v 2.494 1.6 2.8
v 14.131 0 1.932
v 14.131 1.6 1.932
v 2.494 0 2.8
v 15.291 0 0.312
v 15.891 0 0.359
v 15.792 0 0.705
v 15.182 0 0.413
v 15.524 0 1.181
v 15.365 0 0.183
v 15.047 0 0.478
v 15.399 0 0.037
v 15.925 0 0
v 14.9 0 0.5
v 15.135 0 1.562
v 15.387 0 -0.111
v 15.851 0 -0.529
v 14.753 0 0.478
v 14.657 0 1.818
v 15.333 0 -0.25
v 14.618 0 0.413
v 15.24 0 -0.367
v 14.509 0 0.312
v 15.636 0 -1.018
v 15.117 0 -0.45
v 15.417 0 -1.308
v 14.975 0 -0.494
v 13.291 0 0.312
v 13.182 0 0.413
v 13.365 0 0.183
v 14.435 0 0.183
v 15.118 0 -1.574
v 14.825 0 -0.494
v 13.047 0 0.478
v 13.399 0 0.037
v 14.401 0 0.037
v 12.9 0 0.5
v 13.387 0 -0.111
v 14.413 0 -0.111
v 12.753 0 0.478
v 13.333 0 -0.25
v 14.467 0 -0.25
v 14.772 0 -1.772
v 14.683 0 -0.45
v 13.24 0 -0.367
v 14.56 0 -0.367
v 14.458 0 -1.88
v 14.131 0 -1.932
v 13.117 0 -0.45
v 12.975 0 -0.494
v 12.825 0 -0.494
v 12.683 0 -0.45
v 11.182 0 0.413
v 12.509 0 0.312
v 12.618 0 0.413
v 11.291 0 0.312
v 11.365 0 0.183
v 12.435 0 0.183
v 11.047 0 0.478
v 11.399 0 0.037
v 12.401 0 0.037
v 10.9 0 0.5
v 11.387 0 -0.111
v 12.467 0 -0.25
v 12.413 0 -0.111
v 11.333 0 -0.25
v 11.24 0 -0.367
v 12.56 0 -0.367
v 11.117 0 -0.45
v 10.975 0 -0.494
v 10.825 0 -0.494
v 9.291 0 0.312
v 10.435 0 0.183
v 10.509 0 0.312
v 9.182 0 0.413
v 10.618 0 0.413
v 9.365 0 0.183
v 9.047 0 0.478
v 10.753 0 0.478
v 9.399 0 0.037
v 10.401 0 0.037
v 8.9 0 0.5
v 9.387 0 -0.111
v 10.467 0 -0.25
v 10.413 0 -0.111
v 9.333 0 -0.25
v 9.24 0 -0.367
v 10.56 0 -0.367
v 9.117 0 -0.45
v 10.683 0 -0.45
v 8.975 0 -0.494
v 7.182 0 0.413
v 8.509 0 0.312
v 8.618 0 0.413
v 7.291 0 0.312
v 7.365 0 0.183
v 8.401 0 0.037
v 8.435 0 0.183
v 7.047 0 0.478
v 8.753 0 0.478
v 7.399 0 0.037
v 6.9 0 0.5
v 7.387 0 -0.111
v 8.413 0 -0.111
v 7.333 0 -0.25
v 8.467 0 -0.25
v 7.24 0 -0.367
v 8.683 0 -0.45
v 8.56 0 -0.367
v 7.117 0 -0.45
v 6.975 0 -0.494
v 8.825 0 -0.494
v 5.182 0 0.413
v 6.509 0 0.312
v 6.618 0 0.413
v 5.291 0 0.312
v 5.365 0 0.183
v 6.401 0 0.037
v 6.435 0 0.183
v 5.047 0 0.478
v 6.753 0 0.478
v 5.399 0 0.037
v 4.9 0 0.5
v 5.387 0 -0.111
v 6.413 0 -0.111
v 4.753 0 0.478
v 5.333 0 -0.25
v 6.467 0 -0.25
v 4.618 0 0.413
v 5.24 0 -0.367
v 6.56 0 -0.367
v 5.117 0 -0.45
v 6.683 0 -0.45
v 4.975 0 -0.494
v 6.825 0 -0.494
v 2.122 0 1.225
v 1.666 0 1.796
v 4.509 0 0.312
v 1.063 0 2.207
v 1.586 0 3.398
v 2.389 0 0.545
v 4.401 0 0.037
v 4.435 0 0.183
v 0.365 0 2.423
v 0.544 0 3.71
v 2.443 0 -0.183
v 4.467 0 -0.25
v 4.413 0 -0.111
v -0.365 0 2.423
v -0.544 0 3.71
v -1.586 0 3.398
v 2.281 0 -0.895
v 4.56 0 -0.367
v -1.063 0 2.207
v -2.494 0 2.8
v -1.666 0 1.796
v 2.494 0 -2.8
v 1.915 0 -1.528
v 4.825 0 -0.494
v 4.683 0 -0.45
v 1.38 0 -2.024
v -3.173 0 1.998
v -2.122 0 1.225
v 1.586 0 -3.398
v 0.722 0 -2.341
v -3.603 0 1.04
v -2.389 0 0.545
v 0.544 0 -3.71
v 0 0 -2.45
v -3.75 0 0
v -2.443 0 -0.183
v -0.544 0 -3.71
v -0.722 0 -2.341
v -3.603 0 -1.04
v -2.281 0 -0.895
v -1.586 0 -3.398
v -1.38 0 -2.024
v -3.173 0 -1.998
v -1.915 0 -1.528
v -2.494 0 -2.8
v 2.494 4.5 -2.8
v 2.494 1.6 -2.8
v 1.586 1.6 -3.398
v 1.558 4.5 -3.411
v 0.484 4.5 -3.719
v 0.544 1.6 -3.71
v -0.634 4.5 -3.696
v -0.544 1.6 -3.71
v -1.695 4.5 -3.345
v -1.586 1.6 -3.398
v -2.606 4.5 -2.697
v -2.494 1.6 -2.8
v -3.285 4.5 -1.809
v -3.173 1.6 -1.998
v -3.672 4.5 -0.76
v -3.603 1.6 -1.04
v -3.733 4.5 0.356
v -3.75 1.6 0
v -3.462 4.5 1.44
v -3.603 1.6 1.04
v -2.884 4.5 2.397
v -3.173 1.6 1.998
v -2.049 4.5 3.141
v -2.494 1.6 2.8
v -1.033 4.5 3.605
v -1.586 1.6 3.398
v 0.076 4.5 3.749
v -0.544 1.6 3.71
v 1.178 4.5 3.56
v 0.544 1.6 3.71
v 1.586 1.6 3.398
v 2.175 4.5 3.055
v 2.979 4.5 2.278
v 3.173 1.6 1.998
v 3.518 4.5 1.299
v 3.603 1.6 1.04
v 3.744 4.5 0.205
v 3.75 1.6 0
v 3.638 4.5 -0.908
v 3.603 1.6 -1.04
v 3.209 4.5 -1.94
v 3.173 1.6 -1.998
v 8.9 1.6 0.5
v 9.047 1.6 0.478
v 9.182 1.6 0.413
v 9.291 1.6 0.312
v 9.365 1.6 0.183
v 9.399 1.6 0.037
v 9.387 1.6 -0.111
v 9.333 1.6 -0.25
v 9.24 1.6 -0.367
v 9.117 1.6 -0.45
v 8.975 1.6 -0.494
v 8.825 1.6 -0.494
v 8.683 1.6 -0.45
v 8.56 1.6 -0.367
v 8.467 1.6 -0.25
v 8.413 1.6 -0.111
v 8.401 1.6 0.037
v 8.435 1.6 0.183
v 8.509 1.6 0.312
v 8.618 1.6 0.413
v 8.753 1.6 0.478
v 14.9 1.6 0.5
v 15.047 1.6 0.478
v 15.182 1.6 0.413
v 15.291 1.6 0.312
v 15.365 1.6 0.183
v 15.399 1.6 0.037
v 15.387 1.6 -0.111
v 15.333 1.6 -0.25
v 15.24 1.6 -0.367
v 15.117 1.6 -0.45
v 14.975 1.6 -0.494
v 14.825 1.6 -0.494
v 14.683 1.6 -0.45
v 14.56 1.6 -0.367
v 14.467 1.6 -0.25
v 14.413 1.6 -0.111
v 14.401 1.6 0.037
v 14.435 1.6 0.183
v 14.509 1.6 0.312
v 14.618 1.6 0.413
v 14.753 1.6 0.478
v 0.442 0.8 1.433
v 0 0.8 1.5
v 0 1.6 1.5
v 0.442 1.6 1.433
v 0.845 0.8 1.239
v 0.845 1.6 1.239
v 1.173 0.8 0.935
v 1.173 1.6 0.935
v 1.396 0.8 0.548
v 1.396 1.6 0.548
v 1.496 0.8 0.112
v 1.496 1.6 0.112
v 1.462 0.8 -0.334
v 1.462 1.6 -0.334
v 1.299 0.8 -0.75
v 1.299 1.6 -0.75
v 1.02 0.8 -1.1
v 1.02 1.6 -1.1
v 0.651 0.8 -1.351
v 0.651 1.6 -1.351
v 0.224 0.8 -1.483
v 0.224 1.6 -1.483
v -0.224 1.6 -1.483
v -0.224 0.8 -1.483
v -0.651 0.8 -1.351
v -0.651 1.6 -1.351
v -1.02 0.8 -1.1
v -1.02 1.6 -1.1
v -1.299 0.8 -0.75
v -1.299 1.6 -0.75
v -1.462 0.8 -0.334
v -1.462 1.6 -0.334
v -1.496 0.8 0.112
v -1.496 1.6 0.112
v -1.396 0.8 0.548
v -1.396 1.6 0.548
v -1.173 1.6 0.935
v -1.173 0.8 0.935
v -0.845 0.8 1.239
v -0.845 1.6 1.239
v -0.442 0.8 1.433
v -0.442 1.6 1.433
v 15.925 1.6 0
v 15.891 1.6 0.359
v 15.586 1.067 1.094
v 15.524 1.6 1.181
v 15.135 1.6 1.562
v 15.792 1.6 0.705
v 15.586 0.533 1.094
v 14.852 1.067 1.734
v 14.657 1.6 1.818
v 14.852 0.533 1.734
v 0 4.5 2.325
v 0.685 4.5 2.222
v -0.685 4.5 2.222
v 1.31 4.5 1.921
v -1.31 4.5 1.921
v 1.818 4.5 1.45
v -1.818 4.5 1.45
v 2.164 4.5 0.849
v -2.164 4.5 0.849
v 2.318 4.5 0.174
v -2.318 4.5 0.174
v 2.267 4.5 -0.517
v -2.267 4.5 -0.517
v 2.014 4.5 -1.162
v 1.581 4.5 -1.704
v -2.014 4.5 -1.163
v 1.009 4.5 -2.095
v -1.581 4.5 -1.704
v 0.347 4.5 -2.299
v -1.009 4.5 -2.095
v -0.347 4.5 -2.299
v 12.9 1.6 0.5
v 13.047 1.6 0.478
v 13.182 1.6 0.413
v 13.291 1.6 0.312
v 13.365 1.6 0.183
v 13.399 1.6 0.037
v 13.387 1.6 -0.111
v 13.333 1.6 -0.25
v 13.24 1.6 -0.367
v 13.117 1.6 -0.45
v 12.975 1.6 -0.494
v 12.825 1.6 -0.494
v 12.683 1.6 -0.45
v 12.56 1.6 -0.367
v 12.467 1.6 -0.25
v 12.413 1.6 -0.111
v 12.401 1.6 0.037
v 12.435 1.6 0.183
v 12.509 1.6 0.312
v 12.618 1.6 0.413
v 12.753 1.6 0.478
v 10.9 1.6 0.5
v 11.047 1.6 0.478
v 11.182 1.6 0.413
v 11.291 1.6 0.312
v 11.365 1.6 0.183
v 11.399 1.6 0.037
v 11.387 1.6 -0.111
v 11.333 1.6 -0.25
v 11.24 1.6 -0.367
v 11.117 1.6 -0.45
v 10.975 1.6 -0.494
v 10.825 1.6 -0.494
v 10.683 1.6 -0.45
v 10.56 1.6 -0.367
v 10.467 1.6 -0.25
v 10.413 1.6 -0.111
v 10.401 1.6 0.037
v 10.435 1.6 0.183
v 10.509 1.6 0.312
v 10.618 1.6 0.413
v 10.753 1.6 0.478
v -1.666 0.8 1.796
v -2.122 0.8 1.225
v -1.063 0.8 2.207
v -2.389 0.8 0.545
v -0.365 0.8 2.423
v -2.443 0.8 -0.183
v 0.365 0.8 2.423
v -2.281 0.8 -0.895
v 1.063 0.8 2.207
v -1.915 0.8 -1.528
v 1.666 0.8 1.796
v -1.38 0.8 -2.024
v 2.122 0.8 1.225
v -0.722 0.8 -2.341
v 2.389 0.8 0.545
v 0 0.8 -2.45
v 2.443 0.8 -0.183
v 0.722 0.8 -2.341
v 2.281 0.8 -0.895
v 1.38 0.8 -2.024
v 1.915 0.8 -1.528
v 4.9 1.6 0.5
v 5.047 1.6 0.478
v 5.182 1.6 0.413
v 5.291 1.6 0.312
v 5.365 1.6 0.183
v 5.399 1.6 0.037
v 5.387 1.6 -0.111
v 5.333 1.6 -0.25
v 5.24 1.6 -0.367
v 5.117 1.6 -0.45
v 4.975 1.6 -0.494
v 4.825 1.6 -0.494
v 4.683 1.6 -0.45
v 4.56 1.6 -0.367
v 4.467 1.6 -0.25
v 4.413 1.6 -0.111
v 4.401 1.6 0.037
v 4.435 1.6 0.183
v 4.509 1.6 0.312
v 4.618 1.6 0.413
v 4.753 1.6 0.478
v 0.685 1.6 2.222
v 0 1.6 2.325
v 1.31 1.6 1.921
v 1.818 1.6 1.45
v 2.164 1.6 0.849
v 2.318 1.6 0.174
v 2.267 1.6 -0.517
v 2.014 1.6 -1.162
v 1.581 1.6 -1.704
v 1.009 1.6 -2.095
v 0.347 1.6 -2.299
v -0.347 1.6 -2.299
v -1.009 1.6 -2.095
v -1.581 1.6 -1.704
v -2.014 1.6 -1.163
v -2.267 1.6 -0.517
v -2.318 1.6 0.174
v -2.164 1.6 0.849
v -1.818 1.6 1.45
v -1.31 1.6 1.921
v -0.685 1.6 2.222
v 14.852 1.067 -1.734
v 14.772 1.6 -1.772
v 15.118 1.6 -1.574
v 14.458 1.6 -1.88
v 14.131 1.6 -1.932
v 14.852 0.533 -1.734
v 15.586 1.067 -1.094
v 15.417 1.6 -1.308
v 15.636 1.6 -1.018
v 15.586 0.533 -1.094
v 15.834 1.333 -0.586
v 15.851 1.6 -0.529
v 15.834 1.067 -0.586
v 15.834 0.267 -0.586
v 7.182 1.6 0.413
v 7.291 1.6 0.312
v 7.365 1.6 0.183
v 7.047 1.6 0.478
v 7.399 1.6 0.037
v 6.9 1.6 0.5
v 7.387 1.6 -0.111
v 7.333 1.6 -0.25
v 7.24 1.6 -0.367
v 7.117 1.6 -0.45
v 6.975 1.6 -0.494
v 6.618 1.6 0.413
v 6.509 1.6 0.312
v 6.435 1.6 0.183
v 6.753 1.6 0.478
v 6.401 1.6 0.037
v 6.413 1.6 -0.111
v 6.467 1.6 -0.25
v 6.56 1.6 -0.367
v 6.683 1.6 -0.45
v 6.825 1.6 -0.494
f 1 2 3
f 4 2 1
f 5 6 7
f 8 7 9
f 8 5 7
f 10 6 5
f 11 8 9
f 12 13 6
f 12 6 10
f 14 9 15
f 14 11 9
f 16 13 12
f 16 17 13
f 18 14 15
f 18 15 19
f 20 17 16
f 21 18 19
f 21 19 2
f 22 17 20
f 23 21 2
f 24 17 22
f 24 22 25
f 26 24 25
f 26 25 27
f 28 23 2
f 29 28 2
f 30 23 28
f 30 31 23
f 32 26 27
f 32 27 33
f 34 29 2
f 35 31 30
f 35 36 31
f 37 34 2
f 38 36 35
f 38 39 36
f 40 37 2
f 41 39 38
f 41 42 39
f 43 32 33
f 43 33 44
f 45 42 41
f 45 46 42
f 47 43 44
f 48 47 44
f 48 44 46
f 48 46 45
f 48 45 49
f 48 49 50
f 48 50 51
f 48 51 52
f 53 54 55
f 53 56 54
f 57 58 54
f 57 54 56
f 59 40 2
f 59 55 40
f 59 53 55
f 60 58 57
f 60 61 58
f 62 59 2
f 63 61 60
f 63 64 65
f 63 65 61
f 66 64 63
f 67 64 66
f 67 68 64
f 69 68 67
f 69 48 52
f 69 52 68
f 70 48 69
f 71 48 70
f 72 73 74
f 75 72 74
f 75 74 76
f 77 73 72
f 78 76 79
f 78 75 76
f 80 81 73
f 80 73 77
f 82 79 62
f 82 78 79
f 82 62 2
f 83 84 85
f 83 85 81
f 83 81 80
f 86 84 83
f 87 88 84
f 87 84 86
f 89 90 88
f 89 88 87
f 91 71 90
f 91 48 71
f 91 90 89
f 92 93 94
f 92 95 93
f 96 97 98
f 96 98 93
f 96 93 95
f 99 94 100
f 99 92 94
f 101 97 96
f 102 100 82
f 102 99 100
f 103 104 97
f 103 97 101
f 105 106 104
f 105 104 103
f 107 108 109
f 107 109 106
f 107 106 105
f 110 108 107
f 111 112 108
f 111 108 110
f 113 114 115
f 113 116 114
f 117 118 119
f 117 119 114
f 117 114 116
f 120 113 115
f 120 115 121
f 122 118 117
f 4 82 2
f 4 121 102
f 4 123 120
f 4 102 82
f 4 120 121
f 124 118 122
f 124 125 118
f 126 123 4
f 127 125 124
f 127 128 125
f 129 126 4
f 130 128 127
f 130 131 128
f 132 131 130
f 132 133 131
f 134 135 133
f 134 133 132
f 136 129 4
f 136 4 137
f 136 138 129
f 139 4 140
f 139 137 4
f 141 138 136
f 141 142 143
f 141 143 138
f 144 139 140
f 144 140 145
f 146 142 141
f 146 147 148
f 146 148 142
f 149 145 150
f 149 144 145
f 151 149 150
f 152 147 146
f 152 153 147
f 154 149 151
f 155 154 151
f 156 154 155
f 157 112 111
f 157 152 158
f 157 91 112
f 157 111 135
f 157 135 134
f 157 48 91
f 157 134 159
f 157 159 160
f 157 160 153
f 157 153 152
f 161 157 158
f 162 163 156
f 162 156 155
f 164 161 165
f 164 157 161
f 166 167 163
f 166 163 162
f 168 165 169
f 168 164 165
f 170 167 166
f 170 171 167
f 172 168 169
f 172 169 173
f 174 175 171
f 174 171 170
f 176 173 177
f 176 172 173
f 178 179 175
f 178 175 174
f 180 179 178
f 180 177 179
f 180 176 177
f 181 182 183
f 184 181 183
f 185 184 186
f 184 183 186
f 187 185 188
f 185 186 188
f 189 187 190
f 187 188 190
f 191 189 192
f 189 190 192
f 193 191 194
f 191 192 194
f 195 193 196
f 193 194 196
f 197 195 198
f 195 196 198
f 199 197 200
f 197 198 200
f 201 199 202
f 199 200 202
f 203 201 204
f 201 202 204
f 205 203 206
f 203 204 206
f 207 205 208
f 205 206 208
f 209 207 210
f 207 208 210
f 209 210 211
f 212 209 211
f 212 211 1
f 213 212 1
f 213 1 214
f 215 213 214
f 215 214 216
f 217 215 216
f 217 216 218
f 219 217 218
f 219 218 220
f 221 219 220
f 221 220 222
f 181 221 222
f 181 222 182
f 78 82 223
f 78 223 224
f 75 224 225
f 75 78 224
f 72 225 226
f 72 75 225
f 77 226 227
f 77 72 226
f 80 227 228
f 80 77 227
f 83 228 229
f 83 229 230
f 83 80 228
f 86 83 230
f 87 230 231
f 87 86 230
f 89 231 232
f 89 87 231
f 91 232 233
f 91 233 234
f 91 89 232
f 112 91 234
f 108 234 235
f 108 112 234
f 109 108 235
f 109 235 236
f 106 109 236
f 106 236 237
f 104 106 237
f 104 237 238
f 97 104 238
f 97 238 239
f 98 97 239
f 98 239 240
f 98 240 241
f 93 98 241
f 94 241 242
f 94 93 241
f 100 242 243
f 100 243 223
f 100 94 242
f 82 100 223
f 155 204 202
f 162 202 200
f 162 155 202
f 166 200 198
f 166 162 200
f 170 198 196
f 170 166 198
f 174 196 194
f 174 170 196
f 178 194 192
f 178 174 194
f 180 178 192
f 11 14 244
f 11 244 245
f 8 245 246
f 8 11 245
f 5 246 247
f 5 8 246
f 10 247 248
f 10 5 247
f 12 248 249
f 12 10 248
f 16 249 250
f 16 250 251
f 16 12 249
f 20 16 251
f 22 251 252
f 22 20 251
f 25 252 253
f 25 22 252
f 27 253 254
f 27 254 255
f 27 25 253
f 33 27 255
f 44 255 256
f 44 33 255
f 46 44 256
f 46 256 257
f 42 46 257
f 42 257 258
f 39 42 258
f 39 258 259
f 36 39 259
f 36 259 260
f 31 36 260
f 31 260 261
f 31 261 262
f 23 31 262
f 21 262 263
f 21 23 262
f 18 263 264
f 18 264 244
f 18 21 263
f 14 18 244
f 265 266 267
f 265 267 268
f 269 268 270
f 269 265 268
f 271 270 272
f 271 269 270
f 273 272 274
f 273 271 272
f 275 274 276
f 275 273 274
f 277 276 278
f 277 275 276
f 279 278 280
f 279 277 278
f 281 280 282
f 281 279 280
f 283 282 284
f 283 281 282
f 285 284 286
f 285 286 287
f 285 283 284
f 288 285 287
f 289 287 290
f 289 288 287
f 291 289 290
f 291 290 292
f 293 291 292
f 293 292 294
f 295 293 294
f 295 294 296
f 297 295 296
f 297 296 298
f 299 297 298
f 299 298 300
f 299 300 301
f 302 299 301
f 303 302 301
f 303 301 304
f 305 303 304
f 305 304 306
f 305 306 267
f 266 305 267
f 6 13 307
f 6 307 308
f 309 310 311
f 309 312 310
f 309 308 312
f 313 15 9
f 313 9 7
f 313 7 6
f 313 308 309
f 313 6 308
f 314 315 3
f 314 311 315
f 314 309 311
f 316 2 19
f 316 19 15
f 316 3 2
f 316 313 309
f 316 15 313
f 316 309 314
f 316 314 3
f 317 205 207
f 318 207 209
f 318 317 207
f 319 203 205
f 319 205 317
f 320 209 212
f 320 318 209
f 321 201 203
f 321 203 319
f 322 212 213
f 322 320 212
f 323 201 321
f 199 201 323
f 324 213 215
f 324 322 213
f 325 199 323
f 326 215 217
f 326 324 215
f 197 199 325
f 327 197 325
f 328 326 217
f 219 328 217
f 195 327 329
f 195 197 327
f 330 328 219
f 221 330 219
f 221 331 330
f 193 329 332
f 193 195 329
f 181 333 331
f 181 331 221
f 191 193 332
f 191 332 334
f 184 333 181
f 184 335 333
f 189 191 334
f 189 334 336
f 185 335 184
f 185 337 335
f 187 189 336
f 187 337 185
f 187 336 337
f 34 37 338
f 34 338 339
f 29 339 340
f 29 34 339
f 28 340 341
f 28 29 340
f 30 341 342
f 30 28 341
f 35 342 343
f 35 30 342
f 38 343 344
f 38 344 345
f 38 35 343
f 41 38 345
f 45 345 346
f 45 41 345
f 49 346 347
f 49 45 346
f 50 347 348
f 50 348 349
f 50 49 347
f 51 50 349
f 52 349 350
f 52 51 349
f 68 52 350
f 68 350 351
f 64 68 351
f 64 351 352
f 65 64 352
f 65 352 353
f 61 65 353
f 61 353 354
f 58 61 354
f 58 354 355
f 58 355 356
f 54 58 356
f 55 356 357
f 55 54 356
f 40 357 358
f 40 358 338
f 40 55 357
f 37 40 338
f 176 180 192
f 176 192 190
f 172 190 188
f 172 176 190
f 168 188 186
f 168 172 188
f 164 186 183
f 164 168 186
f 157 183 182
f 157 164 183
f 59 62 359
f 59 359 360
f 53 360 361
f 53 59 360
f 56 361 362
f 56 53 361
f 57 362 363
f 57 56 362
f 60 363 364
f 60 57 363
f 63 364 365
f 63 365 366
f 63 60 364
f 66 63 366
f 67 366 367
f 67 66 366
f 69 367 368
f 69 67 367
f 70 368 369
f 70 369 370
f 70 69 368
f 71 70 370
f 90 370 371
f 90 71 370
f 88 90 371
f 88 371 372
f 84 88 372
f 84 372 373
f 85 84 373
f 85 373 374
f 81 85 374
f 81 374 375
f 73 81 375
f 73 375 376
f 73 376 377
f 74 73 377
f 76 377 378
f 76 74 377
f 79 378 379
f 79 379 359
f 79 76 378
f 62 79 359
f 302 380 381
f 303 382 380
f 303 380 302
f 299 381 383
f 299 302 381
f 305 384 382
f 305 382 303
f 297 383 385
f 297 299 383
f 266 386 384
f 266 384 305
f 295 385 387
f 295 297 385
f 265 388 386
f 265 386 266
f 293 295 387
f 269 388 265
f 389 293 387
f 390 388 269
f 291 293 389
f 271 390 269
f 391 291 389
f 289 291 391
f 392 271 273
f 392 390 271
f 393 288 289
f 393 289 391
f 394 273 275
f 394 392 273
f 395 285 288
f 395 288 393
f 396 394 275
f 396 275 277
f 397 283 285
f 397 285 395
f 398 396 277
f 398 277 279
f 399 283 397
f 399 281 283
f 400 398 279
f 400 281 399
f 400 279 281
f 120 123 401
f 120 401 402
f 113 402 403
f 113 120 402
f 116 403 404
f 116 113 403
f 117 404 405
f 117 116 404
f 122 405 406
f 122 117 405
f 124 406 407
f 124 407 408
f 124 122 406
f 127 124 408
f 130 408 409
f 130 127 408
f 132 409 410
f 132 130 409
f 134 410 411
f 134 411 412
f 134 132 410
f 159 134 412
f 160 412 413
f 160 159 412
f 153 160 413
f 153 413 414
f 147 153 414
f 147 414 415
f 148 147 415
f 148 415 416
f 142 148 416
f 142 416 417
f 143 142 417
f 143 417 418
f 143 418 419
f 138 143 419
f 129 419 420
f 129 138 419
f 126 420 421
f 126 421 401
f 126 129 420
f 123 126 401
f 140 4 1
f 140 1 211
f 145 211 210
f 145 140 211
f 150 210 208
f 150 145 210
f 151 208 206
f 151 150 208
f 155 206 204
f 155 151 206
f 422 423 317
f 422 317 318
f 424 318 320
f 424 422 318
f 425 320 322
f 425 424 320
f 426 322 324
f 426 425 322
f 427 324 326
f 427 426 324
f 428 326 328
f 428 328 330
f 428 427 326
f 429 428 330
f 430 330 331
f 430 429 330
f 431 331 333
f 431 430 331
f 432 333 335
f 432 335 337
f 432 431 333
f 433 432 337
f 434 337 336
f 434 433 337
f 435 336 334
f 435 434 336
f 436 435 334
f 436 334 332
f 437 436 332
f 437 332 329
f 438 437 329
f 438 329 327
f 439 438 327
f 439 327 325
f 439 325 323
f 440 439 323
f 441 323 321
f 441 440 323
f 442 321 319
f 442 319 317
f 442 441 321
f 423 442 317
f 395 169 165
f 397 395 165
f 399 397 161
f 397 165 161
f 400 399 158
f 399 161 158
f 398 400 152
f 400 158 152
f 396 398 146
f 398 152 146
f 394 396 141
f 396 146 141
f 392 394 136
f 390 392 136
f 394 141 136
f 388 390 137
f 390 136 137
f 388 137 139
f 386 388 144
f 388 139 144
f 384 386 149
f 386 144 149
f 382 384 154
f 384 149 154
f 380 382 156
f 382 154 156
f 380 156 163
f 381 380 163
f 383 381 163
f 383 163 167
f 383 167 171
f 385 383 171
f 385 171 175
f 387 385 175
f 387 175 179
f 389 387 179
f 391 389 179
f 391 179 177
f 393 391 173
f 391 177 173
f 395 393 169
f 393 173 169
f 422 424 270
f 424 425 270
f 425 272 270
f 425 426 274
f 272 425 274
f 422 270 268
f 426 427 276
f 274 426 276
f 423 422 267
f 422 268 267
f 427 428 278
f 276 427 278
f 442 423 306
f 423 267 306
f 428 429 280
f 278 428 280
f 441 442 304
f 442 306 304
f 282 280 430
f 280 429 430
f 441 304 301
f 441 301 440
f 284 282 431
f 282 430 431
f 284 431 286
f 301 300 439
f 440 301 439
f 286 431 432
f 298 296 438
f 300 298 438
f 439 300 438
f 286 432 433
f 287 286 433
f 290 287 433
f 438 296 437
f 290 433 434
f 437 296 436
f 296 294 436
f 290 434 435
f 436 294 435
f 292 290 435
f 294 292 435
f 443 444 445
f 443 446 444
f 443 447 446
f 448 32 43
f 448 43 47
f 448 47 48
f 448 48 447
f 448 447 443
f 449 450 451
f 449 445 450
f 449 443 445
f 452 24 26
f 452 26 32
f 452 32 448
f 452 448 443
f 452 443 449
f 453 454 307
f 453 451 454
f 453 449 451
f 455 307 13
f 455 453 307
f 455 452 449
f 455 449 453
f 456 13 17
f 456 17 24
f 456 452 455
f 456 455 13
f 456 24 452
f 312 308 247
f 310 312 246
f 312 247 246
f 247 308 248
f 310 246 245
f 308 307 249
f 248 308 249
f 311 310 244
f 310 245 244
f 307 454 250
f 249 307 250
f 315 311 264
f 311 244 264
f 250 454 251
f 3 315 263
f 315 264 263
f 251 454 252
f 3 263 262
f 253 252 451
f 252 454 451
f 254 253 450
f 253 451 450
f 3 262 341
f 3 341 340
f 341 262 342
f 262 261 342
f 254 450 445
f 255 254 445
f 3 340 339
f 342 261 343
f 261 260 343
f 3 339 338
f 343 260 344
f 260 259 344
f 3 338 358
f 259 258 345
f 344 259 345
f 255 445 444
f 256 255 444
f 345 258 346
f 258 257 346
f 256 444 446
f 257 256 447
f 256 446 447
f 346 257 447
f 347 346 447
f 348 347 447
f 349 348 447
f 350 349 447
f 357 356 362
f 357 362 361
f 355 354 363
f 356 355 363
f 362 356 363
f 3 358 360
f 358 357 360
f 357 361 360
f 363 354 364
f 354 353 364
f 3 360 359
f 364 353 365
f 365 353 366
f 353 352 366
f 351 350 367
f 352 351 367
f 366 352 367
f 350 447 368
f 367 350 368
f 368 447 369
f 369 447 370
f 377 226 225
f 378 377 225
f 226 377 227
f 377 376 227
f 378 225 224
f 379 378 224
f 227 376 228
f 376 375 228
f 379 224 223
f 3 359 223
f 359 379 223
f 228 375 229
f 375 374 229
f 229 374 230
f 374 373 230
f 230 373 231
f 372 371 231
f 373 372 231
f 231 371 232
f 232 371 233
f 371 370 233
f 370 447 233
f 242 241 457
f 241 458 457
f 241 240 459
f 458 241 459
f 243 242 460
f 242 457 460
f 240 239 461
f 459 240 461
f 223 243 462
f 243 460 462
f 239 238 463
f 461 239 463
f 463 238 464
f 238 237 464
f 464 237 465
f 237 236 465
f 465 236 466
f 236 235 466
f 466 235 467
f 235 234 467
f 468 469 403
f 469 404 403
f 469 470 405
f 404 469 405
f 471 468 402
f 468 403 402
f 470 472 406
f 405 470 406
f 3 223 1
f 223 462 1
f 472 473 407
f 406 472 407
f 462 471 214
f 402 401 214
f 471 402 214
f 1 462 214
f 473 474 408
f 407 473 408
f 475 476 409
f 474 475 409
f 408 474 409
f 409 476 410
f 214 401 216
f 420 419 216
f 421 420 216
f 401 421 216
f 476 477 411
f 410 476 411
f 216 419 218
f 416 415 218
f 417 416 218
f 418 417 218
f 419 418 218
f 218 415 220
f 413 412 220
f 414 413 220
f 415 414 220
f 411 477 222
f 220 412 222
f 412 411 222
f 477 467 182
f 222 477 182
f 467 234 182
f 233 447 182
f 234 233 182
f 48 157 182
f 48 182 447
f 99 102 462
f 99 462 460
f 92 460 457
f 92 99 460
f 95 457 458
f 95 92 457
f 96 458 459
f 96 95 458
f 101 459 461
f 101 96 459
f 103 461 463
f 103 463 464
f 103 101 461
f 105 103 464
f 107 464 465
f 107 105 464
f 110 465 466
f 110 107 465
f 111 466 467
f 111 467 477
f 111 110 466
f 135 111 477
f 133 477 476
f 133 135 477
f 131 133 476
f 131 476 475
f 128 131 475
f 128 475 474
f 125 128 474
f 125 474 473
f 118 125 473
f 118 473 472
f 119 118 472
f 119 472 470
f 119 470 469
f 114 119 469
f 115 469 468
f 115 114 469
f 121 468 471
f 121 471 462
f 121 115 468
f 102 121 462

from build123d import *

# Parameters (mm, degrees)
SKETCH1_R               = 0.5
SKETCH1_R_2             = 1.5
BOSS_EXTRUDE1_DEPTH     = 1.6
SKETCH2_R               = 3.75
SKETCH2_R_2             = 2.325
BOSS_EXTRUDE2_DEPTH     = 2.9
FILLET1_START           = -1
FILLET1_DEPTH           = 4
FILLET2_START           = -1
FILLET2_DEPTH           = 4
SKETCH3_R               = 2.45
CUT_EXTRUDE1_DEPTH      = 0.8
ENL_V_START             = -10
ENL_V_MAT_EXTRU_1_DEPTH = 10


with BuildPart() as part:
    # Sketch1 → Boss-Extrude1 (new body)
    with BuildSketch(Plane(origin=(0, 0, 0), x_dir=(1, 0, 0), z_dir=(0, 1, 0))):
        with BuildLine():
            Line((2.494493937, 2.8), (14.9, 1.875))
            ThreePointArc((14.9, 1.875), (15.925, 0), (14.9, -1.875))
            Line((14.9, -1.875), (2.494493937, -2.8))
            ThreePointArc((2.494493937, -2.8), (0, -3.75), (-2.494493937, -2.8))
            Line((-2.494493937, -2.8), (-14.9, -1.875))
            ThreePointArc((-14.9, -1.875), (-15.925, 0), (-14.9, 1.875))
            Line((-14.9, 1.875), (-2.494493937, 2.8))
            ThreePointArc((-2.494493937, 2.8), (0, 3.75), (2.494493937, 2.8))
        make_face()
        with Locations(Location((4.9, 0, 0), (0, 0, 270))):
            Circle(SKETCH1_R, mode=Mode.SUBTRACT)
        with Locations(Location((6.9, 0, 0), (0, 0, 270))):
            Circle(SKETCH1_R, mode=Mode.SUBTRACT)
        with Locations(Location((8.9, 0, 0), (0, 0, 270))):
            Circle(SKETCH1_R, mode=Mode.SUBTRACT)
        with Locations(Location((10.9, 0, 0), (0, 0, 270))):
            Circle(SKETCH1_R, mode=Mode.SUBTRACT)
        with Locations(Location((12.9, 0, 0), (0, 0, 270))):
            Circle(SKETCH1_R, mode=Mode.SUBTRACT)
        with Locations(Location((14.9, 0, 0), (0, 0, 270))):
            Circle(SKETCH1_R, mode=Mode.SUBTRACT)
        with Locations(Location((-14.9, 0, 0), (0, 0, 90))):
            Circle(SKETCH1_R, mode=Mode.SUBTRACT)
        with Locations(Location((-12.9, 0, 0), (0, 0, 90))):
            Circle(SKETCH1_R, mode=Mode.SUBTRACT)
        with Locations(Location((-10.9, 0, 0), (0, 0, 90))):
            Circle(SKETCH1_R, mode=Mode.SUBTRACT)
        with Locations(Location((-8.9, 0, 0), (0, 0, 90))):
            Circle(SKETCH1_R, mode=Mode.SUBTRACT)
        with Locations(Location((-6.9, 0, 0), (0, 0, 90))):
            Circle(SKETCH1_R, mode=Mode.SUBTRACT)
        with Locations(Location((-4.9, 0, 0), (0, 0, 90))):
            Circle(SKETCH1_R, mode=Mode.SUBTRACT)
        with Locations(Location((0, 0, 0), (0, 0, 270))):
            Circle(SKETCH1_R_2, mode=Mode.SUBTRACT)
    extrude(amount=BOSS_EXTRUDE1_DEPTH)

    # Sketch2 → Boss-Extrude2 (add)
    with BuildSketch(Plane(origin=(0, 1.6, 0), x_dir=(1, 0, 0), z_dir=(0, 1, 0))):
        with Locations(Location((0, 0, 0), (0, 0, 48.302453397))):
            Circle(SKETCH2_R)
        with Locations(Location((0, 0, 0), (0, 0, 270))):
            Circle(SKETCH2_R_2, mode=Mode.SUBTRACT)
    extrude(amount=BOSS_EXTRUDE2_DEPTH)

    # Fillet1: read off the stored shape, not the designer's step
    # Fillet1 outline → Fillet1 (cut)
    with BuildSketch(Plane(origin=(0, 0, 0), x_dir=(1, 0, 0), z_dir=(0, 1, 0)).offset(FILLET1_START)):
        with BuildLine():
            Line((-14.9, -1.875), (-14.131406802, -1.932309126))
            add(Edge.make_bspline(
                [(-14.131406802, -1.932309126), (-15.060349902, -1.863043724), (-15.925, -1.199048162), (-15.925, 0)],
                knots=[0, 0, 0, 0, 0.5, 0.5, 0.5, 0.5], degree=3, weights=[1, 0.691452416, 0.537178624, 0.537178624]))
            ThreePointArc((-15.925, 0), (-15.652023077, -1.068439282), (-14.9, -1.875))
        make_face()
        with BuildLine():
            ThreePointArc((-14.9, 1.875), (-15.652023077, 1.068439282), (-15.925, 0))
            add(Edge.make_bspline(
                [(-15.925, 0), (-15.925, 1.199048162), (-15.060349902, 1.863043724), (-14.131406802, 1.932309126)],
                knots=[0.5, 0.5, 0.5, 0.5, 1, 1, 1, 1], degree=3, weights=[0.537178624, 0.537178624, 0.691452416, 1]))
            Line((-14.131406802, 1.932309126), (-14.9, 1.875))
        make_face()
    extrude(amount=FILLET1_DEPTH, mode=Mode.SUBTRACT)

    # Fillet2: read off the stored shape, not the designer's step
    # Fillet2 outline → Fillet2 (cut)
    with BuildSketch(Plane(origin=(0, 0, 0), x_dir=(1, 0, 0), z_dir=(0, 1, 0)).offset(FILLET2_START)):
        with BuildLine():
            Line((14.9, 1.875), (14.131406802, 1.932309126))
            add(Edge.make_bspline(
                [(14.131406802, 1.932309126), (15.060349902, 1.863043724), (15.925, 1.199048162), (15.925, 0)],
                knots=[0, 0, 0, 0, 0.5, 0.5, 0.5, 0.5], degree=3, weights=[1, 0.691452416, 0.537178624, 0.537178624]))
            ThreePointArc((15.925, 0), (15.652023077, 1.068439282), (14.9, 1.875))
        make_face()
        with BuildLine():
            ThreePointArc((14.9, -1.875), (15.652023077, -1.068439282), (15.925, 0))
            add(Edge.make_bspline(
                [(15.925, 0), (15.925, -1.199048162), (15.060349902, -1.863043724), (14.131406802, -1.932309126)],
                knots=[0.5, 0.5, 0.5, 0.5, 1, 1, 1, 1], degree=3, weights=[0.537178624, 0.537178624, 0.691452416, 1]))
            Line((14.131406802, -1.932309126), (14.9, -1.875))
        make_face()
    extrude(amount=FILLET2_DEPTH, mode=Mode.SUBTRACT)

    # Sketch3 → Cut-Extrude1 (cut)
    with BuildSketch(Plane.XZ):
        with Locations(Location((0, 0, 0), (0, 0, 270))):
            Circle(SKETCH3_R)
    extrude(amount=-CUT_EXTRUDE1_DEPTH, mode=Mode.SUBTRACT)

    # Esquisse1 → Enlèv. mat.-Extru.1 (cut)
    with BuildSketch(Plane(origin=(0, 1.6, 0), x_dir=(1, 0, 0), z_dir=(0, 1, 0)).offset(ENL_V_START)):
        with BuildLine():
            Line((-2.494493937, 2.8), (-5.326259476, 9.645712634))
            Line((-5.326259476, 9.645712634), (-26.688602042, 9.645712634))
            Line((-26.688602042, 9.645712634), (-23.449621421, -3.244588312))
            Line((-23.449621421, -3.244588312), (-9.542304725, -12.289889455))
            Line((-9.542304725, -12.289889455), (-2.045012757, -5.407049631))
            Line((-2.045012757, -5.407049631), (-2.494493937, -2.8))
            ThreePointArc((-2.494493937, -2.8), (-3.75, 0), (-2.494493937, 2.8))
        make_face()
    extrude(amount=ENL_V_MAT_EXTRU_1_DEPTH, mode=Mode.SUBTRACT)


solid = part.part
